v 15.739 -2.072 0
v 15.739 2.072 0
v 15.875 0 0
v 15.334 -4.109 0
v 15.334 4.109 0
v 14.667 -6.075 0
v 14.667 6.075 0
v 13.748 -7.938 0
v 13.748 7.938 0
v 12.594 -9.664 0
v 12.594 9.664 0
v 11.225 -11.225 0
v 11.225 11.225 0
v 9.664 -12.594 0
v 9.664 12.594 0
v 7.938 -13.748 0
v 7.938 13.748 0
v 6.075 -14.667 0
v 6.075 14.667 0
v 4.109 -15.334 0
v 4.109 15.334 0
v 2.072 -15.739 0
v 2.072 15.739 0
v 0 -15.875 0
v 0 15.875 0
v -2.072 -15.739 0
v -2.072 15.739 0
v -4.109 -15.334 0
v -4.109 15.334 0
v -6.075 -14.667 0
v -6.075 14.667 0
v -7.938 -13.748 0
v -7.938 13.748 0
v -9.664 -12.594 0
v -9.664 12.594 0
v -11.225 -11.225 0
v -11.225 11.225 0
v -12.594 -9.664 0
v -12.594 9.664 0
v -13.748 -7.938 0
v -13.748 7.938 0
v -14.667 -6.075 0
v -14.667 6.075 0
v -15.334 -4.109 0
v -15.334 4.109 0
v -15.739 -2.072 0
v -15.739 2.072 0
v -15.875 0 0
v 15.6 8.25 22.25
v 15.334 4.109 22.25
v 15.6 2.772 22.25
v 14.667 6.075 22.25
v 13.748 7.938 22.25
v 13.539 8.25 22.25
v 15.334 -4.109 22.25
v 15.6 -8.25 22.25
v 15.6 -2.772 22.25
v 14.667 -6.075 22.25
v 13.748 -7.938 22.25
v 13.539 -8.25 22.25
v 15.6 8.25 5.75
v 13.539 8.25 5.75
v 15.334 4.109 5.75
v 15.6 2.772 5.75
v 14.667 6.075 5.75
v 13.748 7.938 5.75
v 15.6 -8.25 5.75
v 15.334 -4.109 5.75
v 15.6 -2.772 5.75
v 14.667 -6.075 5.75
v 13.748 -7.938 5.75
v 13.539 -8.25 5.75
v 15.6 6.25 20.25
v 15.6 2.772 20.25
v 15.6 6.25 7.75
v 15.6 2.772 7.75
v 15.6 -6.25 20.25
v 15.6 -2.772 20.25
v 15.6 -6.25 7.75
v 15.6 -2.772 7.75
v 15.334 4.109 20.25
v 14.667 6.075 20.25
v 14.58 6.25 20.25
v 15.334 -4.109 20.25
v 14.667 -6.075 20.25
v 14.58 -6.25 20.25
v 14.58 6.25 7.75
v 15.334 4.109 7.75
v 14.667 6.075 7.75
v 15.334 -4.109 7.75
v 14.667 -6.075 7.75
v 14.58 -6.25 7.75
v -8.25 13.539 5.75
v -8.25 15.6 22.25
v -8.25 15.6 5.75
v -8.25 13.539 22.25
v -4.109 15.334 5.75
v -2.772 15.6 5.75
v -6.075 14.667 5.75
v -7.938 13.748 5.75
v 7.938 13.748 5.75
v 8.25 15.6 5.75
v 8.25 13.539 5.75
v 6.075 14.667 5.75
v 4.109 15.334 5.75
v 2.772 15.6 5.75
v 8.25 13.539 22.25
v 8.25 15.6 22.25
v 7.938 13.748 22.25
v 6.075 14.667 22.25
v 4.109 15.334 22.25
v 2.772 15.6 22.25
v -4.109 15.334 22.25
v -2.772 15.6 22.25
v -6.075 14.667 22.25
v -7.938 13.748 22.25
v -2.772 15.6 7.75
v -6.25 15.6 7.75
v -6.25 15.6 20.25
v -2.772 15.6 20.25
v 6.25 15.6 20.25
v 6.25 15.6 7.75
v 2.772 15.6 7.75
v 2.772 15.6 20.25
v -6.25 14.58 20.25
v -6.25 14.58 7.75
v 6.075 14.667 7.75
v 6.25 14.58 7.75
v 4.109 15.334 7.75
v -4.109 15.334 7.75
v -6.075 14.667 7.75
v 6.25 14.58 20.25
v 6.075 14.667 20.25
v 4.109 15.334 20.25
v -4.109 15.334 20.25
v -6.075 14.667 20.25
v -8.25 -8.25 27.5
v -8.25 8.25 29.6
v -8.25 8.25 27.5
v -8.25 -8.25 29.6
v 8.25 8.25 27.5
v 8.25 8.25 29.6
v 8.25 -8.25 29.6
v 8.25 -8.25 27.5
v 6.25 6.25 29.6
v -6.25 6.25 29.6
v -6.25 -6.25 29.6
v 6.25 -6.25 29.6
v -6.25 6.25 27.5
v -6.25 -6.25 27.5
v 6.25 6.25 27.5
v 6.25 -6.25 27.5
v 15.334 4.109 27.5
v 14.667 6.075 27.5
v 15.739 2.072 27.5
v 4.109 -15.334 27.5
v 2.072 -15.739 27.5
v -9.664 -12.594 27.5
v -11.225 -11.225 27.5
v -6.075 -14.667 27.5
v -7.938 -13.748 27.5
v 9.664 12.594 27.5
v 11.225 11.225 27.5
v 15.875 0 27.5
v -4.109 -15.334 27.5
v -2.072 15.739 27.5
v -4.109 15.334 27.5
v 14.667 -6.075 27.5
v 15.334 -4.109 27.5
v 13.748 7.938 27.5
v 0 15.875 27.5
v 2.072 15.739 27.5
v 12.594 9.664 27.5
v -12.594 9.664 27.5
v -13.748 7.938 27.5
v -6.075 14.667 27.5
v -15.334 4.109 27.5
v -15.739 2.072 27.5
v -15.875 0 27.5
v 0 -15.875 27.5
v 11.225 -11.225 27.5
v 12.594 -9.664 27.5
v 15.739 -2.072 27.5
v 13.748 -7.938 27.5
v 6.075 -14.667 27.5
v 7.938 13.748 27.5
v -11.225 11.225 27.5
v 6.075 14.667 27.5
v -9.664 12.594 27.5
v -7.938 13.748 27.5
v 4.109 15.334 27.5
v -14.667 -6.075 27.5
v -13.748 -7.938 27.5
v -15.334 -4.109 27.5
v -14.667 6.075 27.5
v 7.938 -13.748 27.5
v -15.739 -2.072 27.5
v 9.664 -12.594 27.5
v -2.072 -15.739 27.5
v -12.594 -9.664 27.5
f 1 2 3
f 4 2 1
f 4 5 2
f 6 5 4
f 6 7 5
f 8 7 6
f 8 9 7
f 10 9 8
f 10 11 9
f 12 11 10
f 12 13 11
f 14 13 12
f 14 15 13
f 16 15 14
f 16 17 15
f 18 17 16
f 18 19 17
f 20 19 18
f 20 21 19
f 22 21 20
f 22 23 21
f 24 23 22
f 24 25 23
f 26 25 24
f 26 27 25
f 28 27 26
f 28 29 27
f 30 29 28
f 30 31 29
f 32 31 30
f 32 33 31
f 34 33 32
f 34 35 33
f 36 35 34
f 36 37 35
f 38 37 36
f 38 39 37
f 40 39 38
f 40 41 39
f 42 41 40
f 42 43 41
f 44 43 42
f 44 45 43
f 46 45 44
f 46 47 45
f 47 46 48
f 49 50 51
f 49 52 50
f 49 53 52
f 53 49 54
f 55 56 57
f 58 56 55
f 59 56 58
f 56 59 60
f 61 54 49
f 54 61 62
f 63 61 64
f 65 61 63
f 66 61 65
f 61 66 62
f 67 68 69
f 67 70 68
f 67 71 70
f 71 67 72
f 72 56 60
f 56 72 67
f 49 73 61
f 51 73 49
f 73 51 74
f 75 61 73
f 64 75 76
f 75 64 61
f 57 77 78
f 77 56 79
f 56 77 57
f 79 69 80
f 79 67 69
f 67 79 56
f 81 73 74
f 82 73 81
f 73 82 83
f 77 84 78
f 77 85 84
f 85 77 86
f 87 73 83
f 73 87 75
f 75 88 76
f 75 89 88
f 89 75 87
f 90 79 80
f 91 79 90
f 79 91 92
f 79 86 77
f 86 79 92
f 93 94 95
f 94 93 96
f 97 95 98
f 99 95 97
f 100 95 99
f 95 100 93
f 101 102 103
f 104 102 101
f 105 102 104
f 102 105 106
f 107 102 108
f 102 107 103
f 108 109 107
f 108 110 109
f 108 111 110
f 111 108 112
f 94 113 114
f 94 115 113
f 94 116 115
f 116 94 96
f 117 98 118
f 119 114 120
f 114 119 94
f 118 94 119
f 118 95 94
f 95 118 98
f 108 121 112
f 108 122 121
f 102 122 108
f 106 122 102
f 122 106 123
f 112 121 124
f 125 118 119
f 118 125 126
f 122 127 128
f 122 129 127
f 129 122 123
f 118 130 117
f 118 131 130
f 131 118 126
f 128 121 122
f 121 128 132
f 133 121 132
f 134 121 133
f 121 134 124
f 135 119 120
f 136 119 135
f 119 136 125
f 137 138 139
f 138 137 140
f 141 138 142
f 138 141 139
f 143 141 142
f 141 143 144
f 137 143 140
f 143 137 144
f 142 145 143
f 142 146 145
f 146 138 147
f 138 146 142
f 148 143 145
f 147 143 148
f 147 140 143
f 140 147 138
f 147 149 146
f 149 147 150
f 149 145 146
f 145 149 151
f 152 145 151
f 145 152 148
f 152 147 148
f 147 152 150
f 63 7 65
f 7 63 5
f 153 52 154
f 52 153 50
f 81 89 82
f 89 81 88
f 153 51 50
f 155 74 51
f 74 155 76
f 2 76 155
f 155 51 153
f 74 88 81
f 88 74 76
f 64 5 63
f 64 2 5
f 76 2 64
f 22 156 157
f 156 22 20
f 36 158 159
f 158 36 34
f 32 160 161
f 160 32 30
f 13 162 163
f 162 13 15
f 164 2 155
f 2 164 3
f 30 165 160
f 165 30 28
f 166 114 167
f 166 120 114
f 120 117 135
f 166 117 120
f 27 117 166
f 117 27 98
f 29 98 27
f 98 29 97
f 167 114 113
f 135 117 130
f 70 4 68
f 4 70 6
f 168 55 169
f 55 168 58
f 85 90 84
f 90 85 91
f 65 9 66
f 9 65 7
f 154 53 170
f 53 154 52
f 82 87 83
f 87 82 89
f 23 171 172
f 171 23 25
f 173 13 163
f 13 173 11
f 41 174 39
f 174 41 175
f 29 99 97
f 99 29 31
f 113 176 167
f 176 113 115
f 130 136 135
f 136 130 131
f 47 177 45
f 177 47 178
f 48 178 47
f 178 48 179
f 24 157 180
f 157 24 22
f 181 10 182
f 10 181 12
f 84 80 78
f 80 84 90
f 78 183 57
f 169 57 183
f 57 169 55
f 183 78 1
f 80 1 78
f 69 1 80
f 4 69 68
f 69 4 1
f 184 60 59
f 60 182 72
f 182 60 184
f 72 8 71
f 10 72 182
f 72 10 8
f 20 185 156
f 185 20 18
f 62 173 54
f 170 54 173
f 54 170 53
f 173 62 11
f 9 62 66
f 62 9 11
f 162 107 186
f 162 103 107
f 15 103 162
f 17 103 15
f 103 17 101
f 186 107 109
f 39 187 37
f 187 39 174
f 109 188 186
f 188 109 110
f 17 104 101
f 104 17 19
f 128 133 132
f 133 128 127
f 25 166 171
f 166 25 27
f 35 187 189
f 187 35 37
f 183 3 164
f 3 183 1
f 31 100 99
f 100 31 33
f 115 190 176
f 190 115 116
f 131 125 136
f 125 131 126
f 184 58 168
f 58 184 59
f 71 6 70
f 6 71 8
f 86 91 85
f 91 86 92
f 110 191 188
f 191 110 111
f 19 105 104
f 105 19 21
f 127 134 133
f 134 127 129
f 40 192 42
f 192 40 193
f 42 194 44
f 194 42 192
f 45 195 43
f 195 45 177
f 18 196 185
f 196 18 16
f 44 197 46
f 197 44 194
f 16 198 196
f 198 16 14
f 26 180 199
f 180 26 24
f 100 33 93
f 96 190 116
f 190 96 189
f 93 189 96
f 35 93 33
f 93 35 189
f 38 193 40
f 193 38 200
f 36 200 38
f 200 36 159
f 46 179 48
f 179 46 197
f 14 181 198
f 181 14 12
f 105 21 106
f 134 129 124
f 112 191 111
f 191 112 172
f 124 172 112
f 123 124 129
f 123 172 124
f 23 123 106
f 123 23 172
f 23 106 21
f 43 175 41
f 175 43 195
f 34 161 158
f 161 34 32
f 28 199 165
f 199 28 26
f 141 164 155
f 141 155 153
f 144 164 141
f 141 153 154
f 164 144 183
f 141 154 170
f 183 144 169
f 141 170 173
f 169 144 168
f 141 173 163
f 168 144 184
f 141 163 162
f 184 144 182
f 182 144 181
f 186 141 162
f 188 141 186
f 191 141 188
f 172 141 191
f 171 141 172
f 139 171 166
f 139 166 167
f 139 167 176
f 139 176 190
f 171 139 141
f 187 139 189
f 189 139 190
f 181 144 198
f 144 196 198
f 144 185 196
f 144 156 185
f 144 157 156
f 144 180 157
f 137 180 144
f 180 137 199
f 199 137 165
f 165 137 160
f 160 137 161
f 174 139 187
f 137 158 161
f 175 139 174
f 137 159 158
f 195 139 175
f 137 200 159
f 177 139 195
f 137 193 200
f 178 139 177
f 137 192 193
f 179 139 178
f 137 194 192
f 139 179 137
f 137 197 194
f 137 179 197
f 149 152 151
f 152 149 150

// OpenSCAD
// concept_C.scad — CONCEPT C "COTS LCC-20 socket per face" (§F seed S3) — REJECTED
// -----------------------------------------------------------------------------
// Screening model: three commercial LCC-20 open-top burn-in/test sockets
// (generic Aries/Plastronics-class geometry: ~16.5 mm sq body, ~7 mm tall,
// requires a carrier PCB ~1.6 mm) mounted on the faces of a 14 mm cube.
// PURPOSE OF THIS MODEL: show the envelope violation quantitatively.
//   socket corner radius = cube/2 + PCB + socket height, out at the socket
//   body corners -> ~17.9 mm > 15.875 mm allowed  => DOES NOT FIT (3 faces).
// Independent kill criteria (see PACKAGING_3D_DESIGN.md §C-C):
//   - contacts are Au OVER NICKEL plated BeCu (ferromagnetic Ni) per Aries
//     materials spec -> disqualified next to a Hall plate
//   - socket plastics (glass-filled PPS/LCP) unrated for UHV outgassing
//   - rated -55..+150 C (burn-in), marginal for in-vessel bake
//   - needs a PCB (FR4/polyimide + ENIG = more Ni) to terminate to
// Render: openscad -o concept_C_iso.png --imgsize=1400,1050 --projection=p \
//         --camera=0,0,0,55,0,25,0 --viewall --autocenter concept_C.scad
// -----------------------------------------------------------------------------

SECTION = 0;

ENV_D = 31.75; ENV_H = 27.5; show_envelope = true;
LCC = 8.89; LCC_T = 1.65;

CUBE   = 14.0;      // even with a minimal cube...
SOCK   = 16.5;      // generic LCC-20 open-top socket body square [mm]
SOCK_H = 7.0;       // body height incl. latch lid (typ. class value)
PCB_T  = 1.6;       // socket must be soldered to a board
STAND_H= 5.0; BASE_T= 2.0; BASE_D = 18.0; EAR_Y = 12.5;
Z0 = STAND_H + BASE_T; ZC = Z0 + CUBE/2;

r_sock = sqrt(pow(CUBE/2+PCB_T+SOCK_H,2)+pow(SOCK/2,2));
echo(str("VIOLATION: side-socket corner radius = ", r_sock,
         " mm  > allowed ", ENV_D/2, " mm"));
echo(str("VIOLATION: socket body corner (radial faces) = ",
         sqrt(2)*SOCK/2 + 0, " mm half-diag on a ", CUBE, " cube"));
echo(str("stack height = ", Z0+CUBE+PCB_T+SOCK_H, " mm (limit ", ENV_H, ")"));

$fn = 48;
module envelope() { color([0.8,0.1,0.1,0.10]) cylinder(h=ENV_H, d=ENV_D); }

module socket_stack() {  // local: face at z=CUBE/2, +z out
  color([0.2,0.5,0.2]) translate([0,0,CUBE/2])                  // PCB
    linear_extrude(PCB_T) square(SOCK+1.5, center=true);
  color([0.15,0.15,0.18]) translate([0,0,CUBE/2+PCB_T]) {       // socket body
    linear_extrude(SOCK_H-2.2) square(SOCK, center=true);
    translate([0,0,SOCK_H-2.2]) linear_extrude(2.2) difference() {
      square(SOCK, center=true); square(SOCK-4, center=true); } // open-top lid
  }
  color([1,0.95,0.72]) translate([0,0,CUBE/2+PCB_T+2.0])        // LCC inside
    linear_extrude(LCC_T) square(LCC, center=true);
}

module on_px() { translate([0,0,ZC]) rotate([0, 90,0]) children(); }
module on_py() { translate([0,0,ZC]) rotate([-90,0,0]) children(); }
module on_pz() { translate([0,0,ZC]) children(); }

module body() color([0.93,0.92,0.86]) {
  translate([0,0,ZC]) cube(CUBE, center=true);
  translate([0,0,STAND_H]) cylinder(h=BASE_T, d=BASE_D);
  for (s=[1,-1]) translate([0,0,STAND_H]) linear_extrude(BASE_T) hull() {
    translate([0, s*EAR_Y]) circle(d=5); translate([0, s*7]) circle(d=5); }
}

module standoffs() color([0.55,0.58,0.62]) for (s=[1,-1])
  translate([0,s*EAR_Y,0]) cylinder(h=STAND_H, d=4.8, $fn=6);

module assembly() {
  standoffs(); body();
  on_px() socket_stack(); on_py() socket_stack(); on_pz() socket_stack();
}

difference() {
  union() { assembly(); if (show_envelope && SECTION==0) envelope(); }
  if (SECTION) translate([-50,-100,-10]) cube([100,100,60]);
}
